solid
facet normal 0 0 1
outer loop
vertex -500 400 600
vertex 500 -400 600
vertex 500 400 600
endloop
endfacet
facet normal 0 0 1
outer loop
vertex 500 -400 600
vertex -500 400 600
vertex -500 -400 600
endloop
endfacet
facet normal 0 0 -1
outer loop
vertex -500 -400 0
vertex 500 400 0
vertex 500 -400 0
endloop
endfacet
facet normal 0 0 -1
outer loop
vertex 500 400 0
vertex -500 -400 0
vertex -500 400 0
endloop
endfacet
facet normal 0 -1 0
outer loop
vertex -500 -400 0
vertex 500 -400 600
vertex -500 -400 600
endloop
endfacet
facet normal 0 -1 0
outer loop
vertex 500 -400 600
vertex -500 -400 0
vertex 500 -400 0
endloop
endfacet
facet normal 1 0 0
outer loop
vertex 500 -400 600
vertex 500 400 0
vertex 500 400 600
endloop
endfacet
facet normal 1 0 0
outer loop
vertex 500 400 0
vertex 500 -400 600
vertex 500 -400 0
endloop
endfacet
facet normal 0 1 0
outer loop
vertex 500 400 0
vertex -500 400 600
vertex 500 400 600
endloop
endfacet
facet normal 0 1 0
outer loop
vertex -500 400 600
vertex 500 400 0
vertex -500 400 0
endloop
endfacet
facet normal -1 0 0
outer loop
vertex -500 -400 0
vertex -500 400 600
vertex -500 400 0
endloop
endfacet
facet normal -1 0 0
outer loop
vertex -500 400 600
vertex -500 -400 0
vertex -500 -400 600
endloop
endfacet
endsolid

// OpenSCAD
$fn=200;

module stadium() {
	translate([0,0,300]) {
		cube([1000,800,600], true);
	}
}


stadium();
